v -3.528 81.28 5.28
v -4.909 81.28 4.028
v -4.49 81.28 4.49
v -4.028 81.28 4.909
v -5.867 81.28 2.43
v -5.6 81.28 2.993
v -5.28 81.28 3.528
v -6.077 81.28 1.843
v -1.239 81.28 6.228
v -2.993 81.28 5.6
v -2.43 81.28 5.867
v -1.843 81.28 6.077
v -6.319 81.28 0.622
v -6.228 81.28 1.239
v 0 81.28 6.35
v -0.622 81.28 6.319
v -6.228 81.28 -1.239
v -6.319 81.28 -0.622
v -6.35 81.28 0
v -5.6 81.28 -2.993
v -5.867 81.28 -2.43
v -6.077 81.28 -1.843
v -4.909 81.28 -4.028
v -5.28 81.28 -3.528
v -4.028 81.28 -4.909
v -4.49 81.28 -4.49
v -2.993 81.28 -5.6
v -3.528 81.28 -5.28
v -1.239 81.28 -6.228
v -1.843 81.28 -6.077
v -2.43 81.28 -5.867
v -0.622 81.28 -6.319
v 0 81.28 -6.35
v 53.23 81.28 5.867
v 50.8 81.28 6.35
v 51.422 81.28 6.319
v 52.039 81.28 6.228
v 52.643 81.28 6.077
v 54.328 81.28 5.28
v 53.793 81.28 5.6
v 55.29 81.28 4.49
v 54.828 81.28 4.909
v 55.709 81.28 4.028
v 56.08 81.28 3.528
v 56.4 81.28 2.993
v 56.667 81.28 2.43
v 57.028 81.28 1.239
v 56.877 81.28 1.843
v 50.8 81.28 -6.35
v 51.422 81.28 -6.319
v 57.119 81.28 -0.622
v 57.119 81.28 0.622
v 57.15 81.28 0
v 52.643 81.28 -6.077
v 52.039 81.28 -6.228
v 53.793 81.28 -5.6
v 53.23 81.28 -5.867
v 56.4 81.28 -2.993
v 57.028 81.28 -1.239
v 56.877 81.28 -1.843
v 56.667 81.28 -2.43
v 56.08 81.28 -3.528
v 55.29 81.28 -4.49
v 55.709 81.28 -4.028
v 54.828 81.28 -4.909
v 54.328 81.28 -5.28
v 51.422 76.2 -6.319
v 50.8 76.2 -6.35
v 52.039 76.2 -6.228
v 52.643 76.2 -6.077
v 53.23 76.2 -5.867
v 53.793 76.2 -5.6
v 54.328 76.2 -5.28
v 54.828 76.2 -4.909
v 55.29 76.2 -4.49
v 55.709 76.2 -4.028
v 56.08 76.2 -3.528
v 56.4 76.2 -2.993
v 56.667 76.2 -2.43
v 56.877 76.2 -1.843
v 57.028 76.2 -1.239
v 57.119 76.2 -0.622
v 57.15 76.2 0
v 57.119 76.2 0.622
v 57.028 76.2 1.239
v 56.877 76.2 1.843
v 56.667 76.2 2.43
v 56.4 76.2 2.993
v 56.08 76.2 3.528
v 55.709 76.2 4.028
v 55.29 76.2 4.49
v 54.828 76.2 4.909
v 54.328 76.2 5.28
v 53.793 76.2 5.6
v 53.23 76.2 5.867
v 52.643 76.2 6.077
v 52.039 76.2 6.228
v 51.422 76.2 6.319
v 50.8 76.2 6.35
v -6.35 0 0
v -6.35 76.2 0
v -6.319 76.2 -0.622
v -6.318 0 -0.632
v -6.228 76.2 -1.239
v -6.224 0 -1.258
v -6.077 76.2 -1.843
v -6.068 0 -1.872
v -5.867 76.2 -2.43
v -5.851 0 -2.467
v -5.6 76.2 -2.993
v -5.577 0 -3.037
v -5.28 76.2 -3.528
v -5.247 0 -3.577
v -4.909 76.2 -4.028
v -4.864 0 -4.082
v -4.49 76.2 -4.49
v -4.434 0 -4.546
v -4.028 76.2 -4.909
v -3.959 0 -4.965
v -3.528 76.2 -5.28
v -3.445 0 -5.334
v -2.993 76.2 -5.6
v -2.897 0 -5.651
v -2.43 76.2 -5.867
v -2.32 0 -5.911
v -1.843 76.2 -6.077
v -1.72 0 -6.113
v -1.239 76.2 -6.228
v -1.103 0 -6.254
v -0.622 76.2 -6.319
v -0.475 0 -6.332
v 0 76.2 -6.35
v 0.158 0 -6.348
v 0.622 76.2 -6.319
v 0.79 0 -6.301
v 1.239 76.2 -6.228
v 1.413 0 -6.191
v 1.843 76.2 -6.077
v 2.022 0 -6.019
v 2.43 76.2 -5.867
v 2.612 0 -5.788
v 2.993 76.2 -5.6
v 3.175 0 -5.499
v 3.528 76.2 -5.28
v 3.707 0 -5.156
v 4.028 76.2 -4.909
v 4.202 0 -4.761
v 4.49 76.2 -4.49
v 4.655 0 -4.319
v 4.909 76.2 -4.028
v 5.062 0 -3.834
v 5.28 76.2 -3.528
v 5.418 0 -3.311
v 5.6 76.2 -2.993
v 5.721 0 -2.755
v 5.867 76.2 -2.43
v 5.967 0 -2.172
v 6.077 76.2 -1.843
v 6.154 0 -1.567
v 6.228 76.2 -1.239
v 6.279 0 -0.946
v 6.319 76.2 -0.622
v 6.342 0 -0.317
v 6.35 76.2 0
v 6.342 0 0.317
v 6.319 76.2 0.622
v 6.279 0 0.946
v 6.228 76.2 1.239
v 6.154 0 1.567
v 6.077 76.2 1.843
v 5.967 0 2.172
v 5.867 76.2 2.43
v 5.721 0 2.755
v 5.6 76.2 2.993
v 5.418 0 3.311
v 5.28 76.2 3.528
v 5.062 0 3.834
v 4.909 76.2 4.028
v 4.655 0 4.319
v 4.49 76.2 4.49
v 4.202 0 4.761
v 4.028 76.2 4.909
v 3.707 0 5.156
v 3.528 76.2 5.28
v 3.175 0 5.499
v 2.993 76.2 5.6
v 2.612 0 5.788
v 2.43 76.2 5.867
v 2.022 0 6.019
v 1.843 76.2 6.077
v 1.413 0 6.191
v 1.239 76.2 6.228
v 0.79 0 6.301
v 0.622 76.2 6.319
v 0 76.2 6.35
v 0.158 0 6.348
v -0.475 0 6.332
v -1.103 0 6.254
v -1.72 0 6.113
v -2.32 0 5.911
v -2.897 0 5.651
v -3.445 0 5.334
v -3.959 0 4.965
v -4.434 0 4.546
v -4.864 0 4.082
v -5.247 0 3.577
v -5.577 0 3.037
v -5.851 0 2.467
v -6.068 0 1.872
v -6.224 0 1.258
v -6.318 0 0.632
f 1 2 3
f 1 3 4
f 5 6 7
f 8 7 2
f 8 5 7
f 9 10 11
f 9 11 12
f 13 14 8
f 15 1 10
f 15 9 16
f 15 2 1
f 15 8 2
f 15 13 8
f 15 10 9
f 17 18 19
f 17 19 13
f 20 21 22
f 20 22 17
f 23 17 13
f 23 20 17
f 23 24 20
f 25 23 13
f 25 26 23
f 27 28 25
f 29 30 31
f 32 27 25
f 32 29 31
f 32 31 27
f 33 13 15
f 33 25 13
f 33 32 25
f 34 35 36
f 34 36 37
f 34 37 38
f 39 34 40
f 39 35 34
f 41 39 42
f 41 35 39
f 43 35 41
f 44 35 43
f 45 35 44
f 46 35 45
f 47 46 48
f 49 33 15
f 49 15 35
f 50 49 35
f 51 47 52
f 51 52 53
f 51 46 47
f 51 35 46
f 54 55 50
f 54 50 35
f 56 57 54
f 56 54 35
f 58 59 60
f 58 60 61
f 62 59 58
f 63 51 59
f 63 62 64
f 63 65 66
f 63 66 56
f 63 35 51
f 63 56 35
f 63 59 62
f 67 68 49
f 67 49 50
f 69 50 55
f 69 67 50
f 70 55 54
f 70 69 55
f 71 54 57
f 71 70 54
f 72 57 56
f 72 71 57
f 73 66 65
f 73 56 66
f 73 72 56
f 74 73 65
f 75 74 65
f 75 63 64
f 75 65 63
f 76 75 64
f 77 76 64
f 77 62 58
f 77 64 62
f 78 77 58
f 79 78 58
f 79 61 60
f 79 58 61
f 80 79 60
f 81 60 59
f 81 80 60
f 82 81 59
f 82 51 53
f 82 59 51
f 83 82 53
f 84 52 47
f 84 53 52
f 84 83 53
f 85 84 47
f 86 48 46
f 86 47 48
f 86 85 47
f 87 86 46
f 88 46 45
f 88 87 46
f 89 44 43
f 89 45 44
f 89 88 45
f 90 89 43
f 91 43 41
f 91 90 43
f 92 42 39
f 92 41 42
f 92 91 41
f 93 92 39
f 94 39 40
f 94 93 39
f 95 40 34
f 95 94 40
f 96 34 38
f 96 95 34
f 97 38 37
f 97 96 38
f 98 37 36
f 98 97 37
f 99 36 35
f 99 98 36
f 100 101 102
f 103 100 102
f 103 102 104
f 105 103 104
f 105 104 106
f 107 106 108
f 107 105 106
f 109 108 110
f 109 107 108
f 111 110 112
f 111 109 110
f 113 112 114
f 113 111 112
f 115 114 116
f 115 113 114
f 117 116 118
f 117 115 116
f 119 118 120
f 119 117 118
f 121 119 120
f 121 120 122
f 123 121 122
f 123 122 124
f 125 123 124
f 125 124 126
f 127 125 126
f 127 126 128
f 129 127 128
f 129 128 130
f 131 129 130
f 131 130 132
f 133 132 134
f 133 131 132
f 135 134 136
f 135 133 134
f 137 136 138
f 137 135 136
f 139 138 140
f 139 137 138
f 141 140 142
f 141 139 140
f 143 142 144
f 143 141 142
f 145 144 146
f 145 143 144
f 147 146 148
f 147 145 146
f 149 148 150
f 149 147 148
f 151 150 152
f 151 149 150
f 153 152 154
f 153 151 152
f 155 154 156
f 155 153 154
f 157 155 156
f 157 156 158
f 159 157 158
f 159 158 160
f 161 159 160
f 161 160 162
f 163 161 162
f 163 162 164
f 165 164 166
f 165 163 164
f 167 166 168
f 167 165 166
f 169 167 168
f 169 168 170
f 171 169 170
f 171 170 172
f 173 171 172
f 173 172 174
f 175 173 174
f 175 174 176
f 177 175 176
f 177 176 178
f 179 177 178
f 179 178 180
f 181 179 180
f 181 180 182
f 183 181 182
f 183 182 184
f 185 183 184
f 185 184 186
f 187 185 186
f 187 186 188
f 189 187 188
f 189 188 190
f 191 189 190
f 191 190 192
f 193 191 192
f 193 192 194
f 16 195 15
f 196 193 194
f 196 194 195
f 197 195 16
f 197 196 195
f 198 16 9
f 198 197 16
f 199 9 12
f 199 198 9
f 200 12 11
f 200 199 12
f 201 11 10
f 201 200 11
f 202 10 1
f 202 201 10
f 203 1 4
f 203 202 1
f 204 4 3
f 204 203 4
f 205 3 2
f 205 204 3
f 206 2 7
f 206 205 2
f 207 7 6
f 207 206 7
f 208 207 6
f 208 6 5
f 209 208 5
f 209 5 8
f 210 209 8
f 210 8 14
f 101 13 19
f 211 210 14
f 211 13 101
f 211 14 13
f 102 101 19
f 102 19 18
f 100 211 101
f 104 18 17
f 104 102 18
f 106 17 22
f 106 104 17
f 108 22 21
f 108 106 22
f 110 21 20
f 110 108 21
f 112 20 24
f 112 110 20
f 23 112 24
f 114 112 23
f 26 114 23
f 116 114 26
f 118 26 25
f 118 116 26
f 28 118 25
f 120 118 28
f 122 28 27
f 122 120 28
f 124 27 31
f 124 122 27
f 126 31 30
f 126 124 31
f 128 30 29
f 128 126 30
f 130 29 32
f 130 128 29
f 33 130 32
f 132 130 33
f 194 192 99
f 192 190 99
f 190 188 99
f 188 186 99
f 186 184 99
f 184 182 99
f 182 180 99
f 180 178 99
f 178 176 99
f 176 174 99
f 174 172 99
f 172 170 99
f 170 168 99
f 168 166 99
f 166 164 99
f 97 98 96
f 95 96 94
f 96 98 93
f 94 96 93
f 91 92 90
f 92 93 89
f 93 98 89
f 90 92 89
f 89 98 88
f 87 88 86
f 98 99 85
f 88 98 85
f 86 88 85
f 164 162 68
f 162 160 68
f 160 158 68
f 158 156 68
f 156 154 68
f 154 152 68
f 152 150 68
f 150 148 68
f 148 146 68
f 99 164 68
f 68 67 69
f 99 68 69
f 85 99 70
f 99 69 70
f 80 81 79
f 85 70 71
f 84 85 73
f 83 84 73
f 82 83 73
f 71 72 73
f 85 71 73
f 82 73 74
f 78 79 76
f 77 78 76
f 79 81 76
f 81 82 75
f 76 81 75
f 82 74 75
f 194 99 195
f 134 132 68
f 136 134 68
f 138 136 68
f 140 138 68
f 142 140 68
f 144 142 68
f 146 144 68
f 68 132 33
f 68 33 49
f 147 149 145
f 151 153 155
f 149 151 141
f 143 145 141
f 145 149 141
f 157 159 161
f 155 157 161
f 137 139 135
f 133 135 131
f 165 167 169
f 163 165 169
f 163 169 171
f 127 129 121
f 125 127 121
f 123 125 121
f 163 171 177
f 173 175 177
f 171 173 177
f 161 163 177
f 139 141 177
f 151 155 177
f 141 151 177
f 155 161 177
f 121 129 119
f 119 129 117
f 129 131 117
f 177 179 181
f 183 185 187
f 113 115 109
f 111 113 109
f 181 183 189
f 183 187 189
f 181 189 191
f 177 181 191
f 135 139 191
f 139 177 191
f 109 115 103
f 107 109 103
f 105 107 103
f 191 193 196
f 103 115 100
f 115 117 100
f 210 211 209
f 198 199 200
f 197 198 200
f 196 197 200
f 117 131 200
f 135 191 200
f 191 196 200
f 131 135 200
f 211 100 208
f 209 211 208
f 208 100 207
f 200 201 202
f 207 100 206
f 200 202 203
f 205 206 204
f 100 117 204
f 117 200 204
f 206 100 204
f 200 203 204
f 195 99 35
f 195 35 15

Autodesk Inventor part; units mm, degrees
ref_plane "YZ Plane" through (0, 0, 0) normal (1, 0, 0) x (0, 1, 0)
ref_plane "XZ Plane" through (0, 0, 0) normal (0, 1, 0) x (-1, 0, 0)
ref_plane "XY Plane" through (0, 0, 0) normal (0, 0, 1) x (1, 0, 0)
sketch "Sketch1" plane through (0, 0, 0) normal (0, 1, 0) x (-1, 0, 0)
  circle A0 centre (0, 0) radius 6.35
  dimension "d0" = 12.7
extrude "Extrusion1" add sketch "Sketch1" along normal blind 76.2
sketch "Sketch2" plane through (0, 76.2, 0) normal (0, 1, 0) x (1, 0, 0)
  arc A0 (0, 6.35) -> (0, -6.35) centre (0, 0) ccw
  line L0 (44.45, 0) -> (50.8, 0)
  arc A1 (50.8, -6.35) -> (50.8, 6.35) centre (50.8, 0) ccw
  line L1 (50.8, -6.35) -> (0, -6.35)
  line L2 (0, 6.35) -> (50.8, 6.35)
  dimension "d4" = 6.35
  dimension "d10" = 50.8
  dimension "d11" = 6.35
  dimension "d12" = 50.8
  dimension "d13" = 6.35
extrude "Extrusion2" add sketch "Sketch2" along normal blind 5.08
properties part number "Motor_Arm"
